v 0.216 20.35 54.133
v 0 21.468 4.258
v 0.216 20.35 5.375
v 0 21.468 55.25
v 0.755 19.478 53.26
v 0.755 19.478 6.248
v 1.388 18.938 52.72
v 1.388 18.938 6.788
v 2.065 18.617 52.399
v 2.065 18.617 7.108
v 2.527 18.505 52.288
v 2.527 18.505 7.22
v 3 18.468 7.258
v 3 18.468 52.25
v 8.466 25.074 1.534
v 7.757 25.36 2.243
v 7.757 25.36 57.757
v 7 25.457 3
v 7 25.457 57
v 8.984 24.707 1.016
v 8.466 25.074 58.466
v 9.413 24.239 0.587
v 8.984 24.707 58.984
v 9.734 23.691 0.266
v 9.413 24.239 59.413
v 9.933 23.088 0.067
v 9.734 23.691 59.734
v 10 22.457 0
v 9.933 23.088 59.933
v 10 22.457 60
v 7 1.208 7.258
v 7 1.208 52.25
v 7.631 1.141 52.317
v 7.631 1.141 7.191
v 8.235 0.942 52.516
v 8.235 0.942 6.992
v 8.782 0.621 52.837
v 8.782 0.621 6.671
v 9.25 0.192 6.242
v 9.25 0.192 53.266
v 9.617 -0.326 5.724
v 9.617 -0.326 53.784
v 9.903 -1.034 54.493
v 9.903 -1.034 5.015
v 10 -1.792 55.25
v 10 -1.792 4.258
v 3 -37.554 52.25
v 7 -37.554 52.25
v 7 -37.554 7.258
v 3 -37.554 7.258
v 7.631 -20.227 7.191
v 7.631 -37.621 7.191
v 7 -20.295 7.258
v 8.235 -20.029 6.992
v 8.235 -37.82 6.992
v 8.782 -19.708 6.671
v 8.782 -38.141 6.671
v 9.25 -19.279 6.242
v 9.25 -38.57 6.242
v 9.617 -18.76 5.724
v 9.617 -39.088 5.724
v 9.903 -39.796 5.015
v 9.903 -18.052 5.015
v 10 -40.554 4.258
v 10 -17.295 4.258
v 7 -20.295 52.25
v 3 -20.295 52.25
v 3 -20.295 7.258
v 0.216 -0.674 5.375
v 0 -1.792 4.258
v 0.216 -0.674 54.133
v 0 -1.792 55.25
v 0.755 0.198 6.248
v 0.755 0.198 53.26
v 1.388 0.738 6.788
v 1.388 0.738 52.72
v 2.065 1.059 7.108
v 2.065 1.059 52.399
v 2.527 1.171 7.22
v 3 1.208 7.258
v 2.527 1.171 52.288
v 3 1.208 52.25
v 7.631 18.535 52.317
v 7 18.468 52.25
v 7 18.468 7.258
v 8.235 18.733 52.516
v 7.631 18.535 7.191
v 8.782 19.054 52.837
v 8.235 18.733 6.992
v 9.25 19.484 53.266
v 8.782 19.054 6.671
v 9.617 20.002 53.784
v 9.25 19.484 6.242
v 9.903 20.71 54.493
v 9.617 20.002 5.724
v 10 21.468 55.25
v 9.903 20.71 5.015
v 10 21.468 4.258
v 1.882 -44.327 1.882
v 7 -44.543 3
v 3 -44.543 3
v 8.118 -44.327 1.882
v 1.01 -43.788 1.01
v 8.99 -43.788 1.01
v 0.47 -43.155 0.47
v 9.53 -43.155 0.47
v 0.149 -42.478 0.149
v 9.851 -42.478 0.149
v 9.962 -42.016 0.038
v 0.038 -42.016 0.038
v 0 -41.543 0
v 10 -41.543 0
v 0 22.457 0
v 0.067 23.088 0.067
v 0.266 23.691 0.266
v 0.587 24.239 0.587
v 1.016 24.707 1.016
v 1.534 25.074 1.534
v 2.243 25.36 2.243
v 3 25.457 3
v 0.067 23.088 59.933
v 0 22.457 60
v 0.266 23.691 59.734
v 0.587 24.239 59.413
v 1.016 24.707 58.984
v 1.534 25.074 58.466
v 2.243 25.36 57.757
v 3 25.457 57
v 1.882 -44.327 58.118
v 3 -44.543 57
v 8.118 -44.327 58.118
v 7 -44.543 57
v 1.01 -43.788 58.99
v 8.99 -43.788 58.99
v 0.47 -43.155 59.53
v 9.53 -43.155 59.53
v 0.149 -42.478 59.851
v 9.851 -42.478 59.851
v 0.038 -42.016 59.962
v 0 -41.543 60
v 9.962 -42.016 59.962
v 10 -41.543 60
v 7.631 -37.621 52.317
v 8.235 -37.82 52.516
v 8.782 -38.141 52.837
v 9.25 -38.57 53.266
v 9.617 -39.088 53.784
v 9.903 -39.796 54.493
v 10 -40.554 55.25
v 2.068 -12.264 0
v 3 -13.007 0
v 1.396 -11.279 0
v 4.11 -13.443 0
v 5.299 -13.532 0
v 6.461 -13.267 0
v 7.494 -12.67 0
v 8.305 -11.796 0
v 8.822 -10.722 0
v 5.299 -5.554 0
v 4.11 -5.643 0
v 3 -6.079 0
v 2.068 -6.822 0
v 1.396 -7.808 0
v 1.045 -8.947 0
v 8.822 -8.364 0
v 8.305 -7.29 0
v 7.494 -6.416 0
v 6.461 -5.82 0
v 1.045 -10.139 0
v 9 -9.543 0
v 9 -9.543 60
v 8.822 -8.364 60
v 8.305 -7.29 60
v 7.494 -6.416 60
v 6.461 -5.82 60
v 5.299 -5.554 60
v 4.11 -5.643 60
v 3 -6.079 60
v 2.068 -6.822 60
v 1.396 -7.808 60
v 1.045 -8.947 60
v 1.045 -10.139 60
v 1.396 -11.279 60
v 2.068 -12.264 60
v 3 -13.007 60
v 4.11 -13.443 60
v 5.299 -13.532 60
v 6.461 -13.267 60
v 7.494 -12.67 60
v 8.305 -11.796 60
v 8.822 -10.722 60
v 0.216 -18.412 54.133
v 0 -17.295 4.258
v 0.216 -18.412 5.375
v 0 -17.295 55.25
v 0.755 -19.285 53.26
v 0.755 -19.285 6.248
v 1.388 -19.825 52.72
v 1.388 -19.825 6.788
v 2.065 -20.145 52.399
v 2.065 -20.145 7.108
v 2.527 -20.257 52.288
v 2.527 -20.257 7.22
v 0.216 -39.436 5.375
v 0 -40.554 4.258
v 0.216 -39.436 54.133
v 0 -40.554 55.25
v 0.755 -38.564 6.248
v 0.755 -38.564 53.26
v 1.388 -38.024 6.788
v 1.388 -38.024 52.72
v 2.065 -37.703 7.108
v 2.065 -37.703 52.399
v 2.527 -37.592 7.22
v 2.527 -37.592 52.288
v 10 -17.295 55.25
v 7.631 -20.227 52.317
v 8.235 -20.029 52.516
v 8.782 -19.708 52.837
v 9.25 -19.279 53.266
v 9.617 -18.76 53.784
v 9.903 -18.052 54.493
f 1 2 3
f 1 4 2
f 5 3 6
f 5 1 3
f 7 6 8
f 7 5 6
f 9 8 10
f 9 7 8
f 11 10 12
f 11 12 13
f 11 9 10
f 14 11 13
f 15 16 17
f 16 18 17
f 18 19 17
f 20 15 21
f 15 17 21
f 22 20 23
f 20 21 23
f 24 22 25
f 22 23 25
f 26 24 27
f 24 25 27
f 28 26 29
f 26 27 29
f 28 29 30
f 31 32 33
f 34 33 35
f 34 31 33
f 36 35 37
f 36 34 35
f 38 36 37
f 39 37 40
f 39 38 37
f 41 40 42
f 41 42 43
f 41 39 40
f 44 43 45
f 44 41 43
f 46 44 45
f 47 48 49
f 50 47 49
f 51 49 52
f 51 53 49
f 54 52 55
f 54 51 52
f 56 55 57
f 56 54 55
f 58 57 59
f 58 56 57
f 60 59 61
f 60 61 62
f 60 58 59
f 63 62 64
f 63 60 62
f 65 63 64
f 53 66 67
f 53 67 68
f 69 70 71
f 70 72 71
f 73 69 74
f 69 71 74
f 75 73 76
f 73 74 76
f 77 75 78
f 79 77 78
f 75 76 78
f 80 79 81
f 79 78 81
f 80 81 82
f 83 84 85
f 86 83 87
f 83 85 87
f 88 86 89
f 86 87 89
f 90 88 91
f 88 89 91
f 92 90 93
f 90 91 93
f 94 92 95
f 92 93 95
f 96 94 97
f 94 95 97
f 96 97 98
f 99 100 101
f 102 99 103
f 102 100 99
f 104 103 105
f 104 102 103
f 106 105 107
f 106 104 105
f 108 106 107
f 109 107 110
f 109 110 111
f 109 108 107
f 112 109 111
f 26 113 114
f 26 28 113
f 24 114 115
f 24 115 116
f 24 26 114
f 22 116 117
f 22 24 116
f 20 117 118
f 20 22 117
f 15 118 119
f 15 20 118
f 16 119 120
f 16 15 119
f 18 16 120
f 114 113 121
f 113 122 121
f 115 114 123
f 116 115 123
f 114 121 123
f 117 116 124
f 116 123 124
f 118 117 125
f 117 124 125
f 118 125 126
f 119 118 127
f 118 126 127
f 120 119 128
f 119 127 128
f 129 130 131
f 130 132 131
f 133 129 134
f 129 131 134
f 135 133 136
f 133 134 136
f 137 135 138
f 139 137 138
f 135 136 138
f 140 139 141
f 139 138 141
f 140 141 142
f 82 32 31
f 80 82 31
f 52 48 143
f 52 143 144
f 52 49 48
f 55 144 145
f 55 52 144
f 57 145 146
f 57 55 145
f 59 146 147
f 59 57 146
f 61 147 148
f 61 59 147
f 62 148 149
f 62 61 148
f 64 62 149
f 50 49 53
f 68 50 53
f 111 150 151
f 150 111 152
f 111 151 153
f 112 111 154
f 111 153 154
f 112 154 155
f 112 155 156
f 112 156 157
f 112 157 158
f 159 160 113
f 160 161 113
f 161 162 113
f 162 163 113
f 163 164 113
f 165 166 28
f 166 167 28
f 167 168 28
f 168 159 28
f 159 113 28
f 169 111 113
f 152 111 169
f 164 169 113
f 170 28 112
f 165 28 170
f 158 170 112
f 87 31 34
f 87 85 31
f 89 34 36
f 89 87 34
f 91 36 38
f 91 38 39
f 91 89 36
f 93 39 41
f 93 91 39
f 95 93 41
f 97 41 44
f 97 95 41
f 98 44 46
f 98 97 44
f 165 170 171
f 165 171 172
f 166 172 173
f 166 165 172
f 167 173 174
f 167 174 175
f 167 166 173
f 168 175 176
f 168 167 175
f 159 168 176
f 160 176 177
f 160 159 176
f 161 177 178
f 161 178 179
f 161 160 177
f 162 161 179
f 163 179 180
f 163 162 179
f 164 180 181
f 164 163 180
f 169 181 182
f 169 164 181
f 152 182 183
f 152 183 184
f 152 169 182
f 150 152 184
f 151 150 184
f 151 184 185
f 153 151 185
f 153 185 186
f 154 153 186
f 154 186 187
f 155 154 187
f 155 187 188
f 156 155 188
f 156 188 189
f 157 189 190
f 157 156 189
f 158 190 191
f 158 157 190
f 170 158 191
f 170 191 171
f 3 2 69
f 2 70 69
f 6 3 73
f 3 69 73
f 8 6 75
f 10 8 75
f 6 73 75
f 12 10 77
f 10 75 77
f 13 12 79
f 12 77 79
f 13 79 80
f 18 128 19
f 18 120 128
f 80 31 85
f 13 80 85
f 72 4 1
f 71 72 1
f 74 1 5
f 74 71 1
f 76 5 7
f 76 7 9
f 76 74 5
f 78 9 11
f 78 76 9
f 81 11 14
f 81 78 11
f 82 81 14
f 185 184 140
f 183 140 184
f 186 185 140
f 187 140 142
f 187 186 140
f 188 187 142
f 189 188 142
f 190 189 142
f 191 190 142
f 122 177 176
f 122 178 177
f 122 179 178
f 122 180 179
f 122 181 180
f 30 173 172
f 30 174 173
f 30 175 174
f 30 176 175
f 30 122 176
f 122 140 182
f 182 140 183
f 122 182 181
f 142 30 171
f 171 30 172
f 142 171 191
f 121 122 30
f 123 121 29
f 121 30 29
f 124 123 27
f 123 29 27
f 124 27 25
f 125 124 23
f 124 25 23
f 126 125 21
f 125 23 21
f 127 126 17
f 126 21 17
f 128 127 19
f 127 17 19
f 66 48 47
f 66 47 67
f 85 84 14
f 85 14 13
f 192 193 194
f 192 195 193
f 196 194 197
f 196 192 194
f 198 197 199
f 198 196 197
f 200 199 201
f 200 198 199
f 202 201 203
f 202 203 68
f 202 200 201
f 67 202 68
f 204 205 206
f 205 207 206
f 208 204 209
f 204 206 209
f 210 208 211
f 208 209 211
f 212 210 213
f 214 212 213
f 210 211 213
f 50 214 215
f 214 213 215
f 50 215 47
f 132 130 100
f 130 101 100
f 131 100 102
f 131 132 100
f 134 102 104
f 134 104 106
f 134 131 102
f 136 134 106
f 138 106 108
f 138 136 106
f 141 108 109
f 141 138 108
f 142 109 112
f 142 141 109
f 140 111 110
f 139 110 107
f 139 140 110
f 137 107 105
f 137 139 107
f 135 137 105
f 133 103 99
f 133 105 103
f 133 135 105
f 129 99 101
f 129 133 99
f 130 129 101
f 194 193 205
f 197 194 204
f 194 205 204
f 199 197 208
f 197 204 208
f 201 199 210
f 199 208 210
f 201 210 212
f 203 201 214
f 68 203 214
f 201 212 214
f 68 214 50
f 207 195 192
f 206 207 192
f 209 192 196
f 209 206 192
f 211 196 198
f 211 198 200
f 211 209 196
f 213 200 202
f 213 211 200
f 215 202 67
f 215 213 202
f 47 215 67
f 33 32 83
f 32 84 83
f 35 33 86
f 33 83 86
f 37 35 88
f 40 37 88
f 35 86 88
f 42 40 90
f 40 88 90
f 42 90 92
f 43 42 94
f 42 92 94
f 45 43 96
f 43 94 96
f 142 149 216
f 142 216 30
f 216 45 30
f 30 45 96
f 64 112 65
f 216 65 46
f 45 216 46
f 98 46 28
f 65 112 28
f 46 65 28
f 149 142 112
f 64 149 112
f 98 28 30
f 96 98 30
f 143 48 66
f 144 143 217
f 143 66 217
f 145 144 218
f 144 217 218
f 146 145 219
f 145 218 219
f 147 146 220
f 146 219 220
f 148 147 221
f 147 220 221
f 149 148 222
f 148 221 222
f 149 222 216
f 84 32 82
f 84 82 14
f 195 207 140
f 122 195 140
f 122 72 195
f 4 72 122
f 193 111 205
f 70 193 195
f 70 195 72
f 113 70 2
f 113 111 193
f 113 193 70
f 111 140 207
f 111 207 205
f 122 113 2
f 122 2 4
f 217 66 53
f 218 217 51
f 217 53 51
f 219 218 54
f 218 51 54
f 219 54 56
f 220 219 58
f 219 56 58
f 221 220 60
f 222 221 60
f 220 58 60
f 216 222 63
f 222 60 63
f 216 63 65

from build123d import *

# Parameters (mm, degrees)
SKETCH_1_W          = 10
SKETCH_1_H          = 70
SKETCH_1_R          = 4
EXTRUDE_1_DEPTH     = 60
SKETCH_2_W          = 44.992308415
SKETCH_2_H          = 17.259344539
CUT_EXTRUDE_1_DEPTH = 76.392930627
FILLET_1_R          = 3


with BuildPart() as part:
    # 草图1 → 凸台-拉伸1 (new body)
    with BuildSketch(Plane.XY):
        with Locations((5, -9.543169943)):
            Rectangle(SKETCH_1_W, SKETCH_1_H)
        with Locations((5, -9.543169943)):
            Circle(SKETCH_1_R, mode=Mode.SUBTRACT)
    extrude(amount=EXTRUDE_1_DEPTH)

    # 草图2 → 切除-拉伸1 (cut, through all)
    with BuildSketch(Plane(origin=(10, 0, 0), x_dir=(0, 0, -1), z_dir=(1, 0, 0))):
        with Locations((-29.753893106, -28.924255962)):
            Rectangle(SKETCH_2_W, SKETCH_2_H)
        with Locations((-29.753893106, 9.837916076)):
            Rectangle(SKETCH_2_W, SKETCH_2_H)
    extrude(amount=-CUT_EXTRUDE_1_DEPTH, mode=Mode.SUBTRACT)

    # 圆角1
    fillet_1_edges = [part.edges().sort_by_distance(p)[0] for p in [
        (5, -44.543169943, 60),
        (10, -28.924255962, 52.250047313),
        (10, -20.294583692, 29.753893106),
        (0, -28.924255962, 7.257738898),
        (0, -37.553928231, 29.753893106),
        (0, -28.924255962, 52.250047313),
        (0, -20.294583692, 29.753893106),
        (10, -37.553928231, 29.753893106),
        (10, -28.924255962, 7.257738898),
        (10, 18.467588345, 29.753893106),
        (10, 9.837916075, 7.257738898),
        (0, 1.208243806, 29.753893106),
        (0, 9.837916075, 52.250047313),
        (0, 18.467588345, 29.753893106),
        (0, 9.837916075, 7.257738898),
        (10, 9.837916075, 52.250047313),
        (10, 1.208243806, 29.753893106),
        (5, 25.456830057, 60),
        (5, -44.543169943, 0),
        (5, 25.456830057, 0),
        (10, 25.456830057, 30),
        (10, -44.543169943, 30),
        (0, -44.543169943, 30),
        (0, 25.456830057, 30),
    ]]
    fillet(fillet_1_edges, radius=FILLET_1_R)


solid = part.part
